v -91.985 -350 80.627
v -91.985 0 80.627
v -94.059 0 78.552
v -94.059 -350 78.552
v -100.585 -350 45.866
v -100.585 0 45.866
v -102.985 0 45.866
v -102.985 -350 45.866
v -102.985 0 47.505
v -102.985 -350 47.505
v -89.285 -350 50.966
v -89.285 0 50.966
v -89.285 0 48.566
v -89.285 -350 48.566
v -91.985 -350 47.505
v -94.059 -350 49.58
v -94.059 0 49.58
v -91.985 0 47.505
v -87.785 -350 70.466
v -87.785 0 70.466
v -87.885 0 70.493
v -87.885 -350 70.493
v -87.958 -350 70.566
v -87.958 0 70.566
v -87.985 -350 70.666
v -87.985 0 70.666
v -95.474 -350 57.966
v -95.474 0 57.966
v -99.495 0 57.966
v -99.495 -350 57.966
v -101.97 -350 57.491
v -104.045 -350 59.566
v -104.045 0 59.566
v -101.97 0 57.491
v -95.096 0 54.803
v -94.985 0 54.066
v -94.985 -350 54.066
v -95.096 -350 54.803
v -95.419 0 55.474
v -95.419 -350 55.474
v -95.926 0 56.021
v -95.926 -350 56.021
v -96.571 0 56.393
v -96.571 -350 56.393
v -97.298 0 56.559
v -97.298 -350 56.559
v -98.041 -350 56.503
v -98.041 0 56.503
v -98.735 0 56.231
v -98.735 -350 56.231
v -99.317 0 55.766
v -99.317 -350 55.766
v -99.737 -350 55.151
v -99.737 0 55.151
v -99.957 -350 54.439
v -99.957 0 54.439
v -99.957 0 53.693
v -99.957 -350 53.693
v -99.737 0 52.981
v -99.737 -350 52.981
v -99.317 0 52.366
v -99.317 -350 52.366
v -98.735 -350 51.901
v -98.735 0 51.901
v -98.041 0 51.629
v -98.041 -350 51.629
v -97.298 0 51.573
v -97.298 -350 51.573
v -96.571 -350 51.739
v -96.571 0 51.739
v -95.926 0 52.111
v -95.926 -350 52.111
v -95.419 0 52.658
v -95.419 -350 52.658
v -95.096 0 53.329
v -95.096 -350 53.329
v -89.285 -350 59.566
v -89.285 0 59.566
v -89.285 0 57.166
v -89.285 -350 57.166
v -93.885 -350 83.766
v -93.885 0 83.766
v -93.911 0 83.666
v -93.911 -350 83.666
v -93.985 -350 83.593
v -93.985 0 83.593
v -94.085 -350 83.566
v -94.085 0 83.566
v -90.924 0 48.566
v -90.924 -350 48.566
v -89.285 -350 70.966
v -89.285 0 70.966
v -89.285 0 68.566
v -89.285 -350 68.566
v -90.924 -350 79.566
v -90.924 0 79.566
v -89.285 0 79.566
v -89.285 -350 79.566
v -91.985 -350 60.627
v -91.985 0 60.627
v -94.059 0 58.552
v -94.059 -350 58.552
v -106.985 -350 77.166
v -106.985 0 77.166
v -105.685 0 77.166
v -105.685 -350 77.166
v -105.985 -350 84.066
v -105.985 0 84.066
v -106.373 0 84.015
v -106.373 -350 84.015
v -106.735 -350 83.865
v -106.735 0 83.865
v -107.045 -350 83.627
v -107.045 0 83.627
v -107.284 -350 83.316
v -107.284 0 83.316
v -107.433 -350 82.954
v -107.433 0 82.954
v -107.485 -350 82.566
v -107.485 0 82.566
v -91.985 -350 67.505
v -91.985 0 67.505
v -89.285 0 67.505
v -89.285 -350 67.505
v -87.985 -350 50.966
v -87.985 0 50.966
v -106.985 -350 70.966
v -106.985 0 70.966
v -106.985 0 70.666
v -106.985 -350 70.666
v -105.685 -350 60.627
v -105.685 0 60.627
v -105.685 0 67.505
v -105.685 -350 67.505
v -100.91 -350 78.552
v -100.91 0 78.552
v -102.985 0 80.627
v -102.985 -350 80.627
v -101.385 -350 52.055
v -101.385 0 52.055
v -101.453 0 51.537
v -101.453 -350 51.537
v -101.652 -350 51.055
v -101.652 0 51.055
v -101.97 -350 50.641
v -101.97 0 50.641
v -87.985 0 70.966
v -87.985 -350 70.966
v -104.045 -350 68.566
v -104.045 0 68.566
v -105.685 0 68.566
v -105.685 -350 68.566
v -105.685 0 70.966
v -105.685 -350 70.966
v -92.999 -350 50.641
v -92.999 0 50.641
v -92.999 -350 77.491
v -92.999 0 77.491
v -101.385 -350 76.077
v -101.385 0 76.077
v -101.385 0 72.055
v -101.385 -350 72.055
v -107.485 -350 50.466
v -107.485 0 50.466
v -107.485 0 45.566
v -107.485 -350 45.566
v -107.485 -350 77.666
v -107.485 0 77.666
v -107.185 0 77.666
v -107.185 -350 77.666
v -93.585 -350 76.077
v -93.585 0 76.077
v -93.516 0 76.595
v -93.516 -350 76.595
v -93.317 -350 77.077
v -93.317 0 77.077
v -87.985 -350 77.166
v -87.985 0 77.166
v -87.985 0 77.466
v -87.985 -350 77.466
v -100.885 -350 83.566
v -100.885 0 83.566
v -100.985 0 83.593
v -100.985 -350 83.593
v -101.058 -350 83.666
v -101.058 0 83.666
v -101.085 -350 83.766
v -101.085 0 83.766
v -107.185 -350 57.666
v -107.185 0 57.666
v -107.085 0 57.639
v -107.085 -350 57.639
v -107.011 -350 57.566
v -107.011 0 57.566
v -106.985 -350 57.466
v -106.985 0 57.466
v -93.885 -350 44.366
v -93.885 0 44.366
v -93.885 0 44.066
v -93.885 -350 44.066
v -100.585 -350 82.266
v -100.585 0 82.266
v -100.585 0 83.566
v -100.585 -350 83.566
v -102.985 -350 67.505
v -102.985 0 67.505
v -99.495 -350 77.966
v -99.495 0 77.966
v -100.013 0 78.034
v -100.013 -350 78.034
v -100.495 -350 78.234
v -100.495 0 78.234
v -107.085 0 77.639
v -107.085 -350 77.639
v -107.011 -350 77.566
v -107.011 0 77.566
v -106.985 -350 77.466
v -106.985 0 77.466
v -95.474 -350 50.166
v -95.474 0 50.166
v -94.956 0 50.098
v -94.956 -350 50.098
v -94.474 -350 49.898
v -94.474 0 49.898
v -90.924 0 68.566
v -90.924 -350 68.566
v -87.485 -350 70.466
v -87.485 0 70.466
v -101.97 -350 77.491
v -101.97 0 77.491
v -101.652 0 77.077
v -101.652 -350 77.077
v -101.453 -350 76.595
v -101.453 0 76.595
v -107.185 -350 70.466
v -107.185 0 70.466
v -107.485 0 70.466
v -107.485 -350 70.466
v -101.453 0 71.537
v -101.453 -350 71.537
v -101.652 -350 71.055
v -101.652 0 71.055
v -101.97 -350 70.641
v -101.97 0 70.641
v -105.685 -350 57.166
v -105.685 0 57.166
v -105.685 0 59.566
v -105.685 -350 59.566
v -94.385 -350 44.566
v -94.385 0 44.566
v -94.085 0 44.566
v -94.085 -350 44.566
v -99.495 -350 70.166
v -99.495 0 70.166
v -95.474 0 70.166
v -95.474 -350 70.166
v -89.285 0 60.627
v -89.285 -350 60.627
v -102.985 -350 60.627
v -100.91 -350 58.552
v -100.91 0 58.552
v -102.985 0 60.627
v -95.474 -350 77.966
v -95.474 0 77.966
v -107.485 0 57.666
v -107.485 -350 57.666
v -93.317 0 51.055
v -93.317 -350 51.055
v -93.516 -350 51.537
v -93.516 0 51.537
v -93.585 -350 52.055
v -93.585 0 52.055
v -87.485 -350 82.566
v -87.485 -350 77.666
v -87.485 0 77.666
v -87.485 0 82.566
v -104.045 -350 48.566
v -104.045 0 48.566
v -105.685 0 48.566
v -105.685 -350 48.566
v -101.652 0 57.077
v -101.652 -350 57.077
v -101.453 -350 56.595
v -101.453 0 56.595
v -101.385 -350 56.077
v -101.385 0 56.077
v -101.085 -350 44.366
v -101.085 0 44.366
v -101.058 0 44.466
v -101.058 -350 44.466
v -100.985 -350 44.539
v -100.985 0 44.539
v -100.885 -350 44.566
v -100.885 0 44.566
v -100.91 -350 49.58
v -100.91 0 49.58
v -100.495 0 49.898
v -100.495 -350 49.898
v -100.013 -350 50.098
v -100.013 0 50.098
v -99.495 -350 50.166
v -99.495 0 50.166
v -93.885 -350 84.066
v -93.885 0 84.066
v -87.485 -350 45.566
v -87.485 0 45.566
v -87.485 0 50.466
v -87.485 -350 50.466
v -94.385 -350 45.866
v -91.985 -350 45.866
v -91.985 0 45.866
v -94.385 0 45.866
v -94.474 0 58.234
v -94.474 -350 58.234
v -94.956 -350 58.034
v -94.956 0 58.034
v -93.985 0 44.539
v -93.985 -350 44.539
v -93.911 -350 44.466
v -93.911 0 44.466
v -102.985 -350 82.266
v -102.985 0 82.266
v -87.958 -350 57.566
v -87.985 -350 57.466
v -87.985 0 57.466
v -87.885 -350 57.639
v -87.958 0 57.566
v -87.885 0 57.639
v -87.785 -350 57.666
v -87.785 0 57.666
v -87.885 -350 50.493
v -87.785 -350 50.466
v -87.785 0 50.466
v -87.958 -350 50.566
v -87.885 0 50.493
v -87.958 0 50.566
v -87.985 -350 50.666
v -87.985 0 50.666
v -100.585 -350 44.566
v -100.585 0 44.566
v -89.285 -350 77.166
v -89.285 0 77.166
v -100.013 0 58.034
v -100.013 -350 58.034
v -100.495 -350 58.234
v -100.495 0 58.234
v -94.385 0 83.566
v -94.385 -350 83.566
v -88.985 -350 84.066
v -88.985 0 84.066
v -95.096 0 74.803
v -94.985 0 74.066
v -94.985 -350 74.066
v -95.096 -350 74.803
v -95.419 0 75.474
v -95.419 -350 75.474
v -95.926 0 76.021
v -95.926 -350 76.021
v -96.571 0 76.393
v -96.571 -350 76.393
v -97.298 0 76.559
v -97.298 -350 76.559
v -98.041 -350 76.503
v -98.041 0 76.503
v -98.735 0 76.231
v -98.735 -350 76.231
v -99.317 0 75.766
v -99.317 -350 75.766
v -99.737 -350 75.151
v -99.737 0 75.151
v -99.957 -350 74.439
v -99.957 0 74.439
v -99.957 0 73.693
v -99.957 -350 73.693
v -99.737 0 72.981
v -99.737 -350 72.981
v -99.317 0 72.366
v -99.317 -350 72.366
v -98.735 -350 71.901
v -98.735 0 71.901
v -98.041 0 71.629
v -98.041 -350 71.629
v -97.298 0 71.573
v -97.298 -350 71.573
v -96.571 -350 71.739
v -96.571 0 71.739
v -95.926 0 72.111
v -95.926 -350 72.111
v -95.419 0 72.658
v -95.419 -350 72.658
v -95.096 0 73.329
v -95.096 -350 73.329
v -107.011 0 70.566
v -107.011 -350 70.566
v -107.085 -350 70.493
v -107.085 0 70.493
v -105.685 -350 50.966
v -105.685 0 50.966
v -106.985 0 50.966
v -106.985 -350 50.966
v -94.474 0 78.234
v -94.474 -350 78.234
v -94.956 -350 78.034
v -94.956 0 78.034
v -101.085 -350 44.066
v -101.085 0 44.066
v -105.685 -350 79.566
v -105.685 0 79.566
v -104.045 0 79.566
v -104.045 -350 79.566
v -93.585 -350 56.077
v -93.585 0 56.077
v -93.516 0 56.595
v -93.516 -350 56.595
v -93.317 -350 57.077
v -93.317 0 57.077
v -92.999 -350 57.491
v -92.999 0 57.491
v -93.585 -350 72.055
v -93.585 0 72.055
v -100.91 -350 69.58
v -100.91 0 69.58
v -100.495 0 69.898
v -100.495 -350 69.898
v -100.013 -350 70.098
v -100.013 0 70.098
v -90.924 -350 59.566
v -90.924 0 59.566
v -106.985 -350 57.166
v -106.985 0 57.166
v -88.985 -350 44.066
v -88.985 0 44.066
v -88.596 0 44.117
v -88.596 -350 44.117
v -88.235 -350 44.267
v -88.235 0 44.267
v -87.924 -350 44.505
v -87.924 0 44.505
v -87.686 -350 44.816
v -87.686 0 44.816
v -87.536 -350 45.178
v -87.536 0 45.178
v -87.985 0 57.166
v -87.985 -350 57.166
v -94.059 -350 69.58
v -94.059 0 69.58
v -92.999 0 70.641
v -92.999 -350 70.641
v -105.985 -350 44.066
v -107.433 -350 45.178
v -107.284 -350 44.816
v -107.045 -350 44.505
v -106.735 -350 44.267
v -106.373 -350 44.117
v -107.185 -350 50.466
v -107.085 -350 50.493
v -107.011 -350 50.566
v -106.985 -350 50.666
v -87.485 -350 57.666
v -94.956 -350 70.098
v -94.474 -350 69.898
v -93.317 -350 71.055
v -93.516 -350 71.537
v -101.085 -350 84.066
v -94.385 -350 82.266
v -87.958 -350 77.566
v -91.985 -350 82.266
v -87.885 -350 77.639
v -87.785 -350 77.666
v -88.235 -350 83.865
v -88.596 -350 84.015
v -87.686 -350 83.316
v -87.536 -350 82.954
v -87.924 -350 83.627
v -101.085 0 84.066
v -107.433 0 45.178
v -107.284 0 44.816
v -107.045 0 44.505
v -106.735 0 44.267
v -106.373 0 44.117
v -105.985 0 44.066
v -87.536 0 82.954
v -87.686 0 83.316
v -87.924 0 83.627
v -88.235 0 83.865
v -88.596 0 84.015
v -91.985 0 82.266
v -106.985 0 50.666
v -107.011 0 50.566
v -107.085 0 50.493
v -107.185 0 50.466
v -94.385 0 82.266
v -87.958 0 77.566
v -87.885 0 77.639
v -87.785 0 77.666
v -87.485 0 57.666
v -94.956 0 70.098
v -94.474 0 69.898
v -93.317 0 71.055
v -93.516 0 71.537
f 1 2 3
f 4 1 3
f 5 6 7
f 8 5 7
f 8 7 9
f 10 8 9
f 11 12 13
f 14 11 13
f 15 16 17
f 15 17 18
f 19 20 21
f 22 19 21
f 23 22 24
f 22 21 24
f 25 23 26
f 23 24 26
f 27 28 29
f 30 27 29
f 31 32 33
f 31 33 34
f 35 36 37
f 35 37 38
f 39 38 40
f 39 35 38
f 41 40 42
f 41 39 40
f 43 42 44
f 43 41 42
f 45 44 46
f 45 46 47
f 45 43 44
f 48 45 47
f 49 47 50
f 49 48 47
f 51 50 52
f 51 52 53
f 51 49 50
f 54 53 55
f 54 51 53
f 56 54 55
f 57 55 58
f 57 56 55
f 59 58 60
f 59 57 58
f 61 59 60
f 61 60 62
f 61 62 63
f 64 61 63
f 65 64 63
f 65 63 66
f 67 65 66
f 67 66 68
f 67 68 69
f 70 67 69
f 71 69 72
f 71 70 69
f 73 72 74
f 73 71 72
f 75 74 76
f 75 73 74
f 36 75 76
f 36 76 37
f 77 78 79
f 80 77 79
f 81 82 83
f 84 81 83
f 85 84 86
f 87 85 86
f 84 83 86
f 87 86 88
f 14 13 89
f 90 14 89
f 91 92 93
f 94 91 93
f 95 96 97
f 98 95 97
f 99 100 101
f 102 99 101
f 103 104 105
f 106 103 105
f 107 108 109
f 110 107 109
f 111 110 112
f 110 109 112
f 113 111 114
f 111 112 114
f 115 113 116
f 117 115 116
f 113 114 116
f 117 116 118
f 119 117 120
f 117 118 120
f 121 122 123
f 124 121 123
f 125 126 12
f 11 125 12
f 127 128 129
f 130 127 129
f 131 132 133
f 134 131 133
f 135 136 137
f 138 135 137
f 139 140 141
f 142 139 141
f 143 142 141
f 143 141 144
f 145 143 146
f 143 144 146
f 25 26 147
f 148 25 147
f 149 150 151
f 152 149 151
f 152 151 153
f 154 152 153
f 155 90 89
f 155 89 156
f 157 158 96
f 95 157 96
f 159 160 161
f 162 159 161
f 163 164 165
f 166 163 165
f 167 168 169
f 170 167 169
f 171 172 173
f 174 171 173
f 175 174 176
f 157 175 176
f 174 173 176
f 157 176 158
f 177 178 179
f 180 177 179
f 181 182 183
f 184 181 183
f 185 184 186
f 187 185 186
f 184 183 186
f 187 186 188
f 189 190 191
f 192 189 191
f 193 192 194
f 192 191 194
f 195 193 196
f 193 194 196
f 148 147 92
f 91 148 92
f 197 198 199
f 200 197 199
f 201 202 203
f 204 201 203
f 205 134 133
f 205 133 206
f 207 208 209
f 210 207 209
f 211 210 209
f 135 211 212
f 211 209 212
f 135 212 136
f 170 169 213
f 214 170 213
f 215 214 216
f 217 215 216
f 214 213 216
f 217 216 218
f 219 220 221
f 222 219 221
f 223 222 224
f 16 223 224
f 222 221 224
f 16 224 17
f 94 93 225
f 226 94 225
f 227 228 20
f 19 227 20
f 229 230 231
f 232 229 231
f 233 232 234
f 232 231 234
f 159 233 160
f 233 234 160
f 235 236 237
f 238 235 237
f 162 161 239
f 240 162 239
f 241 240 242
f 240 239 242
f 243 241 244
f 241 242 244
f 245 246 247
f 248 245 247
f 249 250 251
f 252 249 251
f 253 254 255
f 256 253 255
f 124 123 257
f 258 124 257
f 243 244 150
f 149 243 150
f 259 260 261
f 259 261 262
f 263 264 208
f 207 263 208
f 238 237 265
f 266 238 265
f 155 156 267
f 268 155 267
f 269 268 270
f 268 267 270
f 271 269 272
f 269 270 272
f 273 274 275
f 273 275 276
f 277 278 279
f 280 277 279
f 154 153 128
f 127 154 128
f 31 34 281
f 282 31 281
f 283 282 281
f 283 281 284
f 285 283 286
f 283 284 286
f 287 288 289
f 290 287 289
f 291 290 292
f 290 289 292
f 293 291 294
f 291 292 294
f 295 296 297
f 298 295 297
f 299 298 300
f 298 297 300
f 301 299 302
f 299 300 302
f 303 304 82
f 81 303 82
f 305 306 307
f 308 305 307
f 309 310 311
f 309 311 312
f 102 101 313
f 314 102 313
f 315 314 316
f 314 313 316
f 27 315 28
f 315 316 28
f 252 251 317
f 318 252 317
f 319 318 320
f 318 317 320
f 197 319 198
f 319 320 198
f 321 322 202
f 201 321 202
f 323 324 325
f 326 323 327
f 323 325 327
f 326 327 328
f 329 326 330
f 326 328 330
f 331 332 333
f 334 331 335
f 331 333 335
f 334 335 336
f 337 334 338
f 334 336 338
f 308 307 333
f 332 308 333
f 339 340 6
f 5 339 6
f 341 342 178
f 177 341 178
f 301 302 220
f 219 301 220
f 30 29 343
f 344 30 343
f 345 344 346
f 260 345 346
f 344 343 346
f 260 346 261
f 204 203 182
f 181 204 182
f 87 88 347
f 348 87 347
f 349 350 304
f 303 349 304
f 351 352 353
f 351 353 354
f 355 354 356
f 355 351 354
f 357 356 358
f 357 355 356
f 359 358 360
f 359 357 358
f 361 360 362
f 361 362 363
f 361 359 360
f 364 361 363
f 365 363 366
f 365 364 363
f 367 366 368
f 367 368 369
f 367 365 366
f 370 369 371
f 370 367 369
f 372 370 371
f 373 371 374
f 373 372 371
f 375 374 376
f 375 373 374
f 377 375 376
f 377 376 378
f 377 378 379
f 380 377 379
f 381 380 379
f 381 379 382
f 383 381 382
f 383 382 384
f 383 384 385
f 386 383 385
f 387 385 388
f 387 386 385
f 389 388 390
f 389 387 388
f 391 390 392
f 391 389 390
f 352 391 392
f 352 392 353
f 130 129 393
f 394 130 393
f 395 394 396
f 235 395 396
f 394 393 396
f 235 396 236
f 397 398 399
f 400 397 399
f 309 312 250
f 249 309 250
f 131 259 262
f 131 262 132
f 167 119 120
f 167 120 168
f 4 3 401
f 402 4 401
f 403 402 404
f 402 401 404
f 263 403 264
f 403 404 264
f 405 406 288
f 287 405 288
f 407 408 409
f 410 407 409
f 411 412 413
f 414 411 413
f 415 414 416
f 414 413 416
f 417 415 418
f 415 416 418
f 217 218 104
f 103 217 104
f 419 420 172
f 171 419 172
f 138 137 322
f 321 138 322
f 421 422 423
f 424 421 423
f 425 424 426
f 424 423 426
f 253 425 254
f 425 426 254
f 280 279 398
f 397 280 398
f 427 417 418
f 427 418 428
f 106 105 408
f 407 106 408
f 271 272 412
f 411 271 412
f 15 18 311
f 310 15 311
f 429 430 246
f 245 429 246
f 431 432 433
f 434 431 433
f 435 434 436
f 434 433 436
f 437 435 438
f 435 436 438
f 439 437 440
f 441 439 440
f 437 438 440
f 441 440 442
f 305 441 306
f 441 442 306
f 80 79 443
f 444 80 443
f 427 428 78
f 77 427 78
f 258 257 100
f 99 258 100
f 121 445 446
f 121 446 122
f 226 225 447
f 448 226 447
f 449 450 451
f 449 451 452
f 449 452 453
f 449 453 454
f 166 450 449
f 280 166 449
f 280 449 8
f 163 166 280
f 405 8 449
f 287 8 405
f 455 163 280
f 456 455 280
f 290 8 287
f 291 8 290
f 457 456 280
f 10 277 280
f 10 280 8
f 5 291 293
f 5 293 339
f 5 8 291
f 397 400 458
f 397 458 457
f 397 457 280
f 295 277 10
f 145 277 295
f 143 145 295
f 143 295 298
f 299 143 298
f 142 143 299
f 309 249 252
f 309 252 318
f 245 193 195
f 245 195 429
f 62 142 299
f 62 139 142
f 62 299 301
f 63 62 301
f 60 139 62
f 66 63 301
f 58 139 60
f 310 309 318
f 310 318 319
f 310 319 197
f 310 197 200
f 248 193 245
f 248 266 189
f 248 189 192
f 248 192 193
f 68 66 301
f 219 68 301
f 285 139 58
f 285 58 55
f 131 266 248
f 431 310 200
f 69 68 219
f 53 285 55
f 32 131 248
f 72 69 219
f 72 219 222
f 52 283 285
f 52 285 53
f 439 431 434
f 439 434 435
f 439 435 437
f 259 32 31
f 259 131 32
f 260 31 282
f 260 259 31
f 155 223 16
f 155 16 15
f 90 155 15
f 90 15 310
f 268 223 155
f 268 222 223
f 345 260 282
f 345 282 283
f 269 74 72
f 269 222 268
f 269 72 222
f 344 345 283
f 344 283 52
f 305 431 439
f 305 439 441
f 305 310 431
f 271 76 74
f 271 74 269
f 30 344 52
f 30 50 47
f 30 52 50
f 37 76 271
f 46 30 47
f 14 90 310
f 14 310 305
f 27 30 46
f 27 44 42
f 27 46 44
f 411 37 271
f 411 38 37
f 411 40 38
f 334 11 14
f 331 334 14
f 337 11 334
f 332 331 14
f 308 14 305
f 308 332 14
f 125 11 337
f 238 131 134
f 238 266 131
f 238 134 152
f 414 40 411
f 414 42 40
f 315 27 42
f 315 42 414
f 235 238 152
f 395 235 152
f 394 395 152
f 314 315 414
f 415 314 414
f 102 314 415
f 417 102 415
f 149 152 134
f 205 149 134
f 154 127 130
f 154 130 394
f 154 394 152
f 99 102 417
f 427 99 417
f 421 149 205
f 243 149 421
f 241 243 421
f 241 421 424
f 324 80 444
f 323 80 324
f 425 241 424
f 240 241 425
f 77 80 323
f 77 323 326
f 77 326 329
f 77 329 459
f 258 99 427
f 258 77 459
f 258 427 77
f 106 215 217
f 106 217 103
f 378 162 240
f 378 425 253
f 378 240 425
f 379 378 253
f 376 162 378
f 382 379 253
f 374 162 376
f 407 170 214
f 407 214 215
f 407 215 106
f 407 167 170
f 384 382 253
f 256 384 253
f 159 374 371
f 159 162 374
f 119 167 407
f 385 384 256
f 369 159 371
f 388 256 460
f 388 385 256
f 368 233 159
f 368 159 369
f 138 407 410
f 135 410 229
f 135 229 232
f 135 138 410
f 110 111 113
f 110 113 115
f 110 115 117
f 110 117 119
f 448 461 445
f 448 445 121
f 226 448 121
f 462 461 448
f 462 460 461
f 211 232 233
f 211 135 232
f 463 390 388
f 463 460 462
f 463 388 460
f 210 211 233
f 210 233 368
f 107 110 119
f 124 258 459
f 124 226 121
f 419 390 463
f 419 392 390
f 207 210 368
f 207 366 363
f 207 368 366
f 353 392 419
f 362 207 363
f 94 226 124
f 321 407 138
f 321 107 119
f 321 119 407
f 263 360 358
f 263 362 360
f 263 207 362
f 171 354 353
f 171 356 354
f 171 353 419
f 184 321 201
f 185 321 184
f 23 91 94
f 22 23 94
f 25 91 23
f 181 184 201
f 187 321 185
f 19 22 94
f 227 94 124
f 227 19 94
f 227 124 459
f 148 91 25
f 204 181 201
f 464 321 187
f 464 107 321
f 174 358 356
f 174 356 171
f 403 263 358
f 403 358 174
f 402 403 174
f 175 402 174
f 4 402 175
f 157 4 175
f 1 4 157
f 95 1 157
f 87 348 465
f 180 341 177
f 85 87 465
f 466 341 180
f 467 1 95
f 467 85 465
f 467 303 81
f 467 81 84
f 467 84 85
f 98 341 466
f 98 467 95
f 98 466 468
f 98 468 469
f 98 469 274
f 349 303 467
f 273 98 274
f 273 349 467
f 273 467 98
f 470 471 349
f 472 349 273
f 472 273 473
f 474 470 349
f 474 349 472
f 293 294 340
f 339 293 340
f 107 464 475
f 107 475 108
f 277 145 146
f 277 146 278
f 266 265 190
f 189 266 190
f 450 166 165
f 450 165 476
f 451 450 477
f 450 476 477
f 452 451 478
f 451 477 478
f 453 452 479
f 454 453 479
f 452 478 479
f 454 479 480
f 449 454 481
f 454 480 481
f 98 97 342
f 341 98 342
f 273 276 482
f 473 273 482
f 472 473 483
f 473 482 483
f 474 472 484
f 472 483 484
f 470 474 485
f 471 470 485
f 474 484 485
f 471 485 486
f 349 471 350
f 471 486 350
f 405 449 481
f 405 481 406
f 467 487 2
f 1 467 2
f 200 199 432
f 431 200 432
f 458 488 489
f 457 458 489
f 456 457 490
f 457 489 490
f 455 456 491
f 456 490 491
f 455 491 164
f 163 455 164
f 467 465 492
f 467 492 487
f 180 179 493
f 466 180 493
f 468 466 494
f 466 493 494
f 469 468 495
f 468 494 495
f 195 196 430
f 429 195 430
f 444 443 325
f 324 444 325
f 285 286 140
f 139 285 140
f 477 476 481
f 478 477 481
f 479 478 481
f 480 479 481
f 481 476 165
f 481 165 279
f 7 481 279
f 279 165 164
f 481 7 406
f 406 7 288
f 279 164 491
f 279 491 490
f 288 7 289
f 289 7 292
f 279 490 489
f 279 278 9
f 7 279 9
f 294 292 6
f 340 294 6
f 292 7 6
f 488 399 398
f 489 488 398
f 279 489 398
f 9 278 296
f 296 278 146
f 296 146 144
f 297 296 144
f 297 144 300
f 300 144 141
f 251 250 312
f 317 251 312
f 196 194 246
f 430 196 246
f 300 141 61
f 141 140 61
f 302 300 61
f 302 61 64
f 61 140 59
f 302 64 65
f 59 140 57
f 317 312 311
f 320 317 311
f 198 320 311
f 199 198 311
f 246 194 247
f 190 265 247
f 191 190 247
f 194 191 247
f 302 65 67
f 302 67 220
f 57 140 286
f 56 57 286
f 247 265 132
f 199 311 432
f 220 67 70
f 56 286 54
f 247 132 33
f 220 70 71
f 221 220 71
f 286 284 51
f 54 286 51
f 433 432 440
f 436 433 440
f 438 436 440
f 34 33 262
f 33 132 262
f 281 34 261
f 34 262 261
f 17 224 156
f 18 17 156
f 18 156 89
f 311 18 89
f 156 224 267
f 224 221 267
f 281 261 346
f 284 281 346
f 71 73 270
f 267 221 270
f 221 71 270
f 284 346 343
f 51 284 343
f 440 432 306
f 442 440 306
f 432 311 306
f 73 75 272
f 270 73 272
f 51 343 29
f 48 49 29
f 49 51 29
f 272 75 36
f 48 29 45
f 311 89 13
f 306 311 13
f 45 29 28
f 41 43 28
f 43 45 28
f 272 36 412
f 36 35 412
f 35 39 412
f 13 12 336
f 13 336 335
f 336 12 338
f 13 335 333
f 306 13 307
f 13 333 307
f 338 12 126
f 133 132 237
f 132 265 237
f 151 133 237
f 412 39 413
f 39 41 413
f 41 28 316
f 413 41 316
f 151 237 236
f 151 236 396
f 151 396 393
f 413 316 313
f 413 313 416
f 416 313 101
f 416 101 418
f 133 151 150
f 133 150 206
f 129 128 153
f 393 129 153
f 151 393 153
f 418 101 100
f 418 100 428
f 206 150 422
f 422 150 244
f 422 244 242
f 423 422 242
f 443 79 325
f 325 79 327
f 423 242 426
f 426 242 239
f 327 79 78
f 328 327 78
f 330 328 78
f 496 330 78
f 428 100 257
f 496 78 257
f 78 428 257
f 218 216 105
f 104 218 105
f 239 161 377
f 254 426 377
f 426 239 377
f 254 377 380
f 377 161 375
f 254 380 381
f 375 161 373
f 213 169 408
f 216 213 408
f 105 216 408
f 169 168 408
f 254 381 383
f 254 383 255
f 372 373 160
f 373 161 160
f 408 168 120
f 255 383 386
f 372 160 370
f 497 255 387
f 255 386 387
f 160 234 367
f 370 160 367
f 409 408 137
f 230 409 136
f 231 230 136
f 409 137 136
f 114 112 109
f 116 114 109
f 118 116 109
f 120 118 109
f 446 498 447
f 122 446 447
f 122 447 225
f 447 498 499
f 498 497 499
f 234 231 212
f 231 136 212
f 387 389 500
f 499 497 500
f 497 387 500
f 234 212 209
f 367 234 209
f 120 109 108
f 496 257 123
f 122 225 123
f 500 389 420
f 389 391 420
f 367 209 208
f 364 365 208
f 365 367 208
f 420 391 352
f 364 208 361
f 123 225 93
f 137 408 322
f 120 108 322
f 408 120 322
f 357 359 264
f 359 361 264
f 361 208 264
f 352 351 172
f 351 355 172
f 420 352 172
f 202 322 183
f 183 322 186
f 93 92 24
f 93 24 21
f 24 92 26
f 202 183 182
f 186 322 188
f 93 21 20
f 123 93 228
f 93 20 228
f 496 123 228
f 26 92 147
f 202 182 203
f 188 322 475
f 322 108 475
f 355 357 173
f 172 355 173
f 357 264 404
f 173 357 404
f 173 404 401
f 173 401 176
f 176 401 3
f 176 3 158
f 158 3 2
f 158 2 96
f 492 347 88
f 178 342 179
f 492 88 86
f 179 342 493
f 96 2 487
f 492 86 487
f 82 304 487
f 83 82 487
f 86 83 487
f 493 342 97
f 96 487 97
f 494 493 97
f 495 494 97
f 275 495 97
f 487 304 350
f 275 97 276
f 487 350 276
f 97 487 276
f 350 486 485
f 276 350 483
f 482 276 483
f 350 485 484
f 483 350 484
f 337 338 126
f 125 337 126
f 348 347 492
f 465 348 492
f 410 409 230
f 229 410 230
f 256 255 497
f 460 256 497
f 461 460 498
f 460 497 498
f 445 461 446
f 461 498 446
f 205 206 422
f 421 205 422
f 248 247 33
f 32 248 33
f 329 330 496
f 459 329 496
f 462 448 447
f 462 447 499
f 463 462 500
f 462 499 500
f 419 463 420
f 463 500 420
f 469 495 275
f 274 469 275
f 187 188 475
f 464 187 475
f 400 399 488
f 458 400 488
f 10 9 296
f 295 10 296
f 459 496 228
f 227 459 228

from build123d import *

# Parameters (mm, degrees)
F0_R     = 2.5
F1_DEPTH = 350


with BuildPart() as f1:
    # F0 (on Front) → F1 (new body)
    with BuildSketch(Plane.XZ):
        with BuildLine():
            Line((-91.984542, 44.065978), (-88.984542, 44.065978))
            ThreePointArc((-88.984542, 44.065978), (-87.923881, 44.505318), (-87.484542, 45.565978))
            Line((-87.484542, 45.565978), (-87.484542, 48.565978))
            Line((-87.484542, 48.565978), (-87.484542, 50.465978))
            Line((-87.484542, 50.465978), (-87.784542, 50.465978))
            ThreePointArc((-87.784542, 50.465978), (-87.925963, 50.524557), (-87.984542, 50.665978))
            Line((-87.984542, 50.665978), (-87.984542, 50.965978))
            Line((-87.984542, 50.965978), (-89.284542, 50.965978))
            Line((-89.284542, 50.965978), (-89.284542, 48.565978))
            Line((-89.284542, 48.565978), (-90.923881, 48.565978))
            Line((-90.923881, 48.565978), (-92.998755, 50.640852))
            ThreePointArc((-92.998755, 50.640852), (-93.432301, 51.289698), (-93.584542, 52.055065))
            Line((-93.584542, 52.055065), (-93.584542, 56.076891))
            ThreePointArc((-93.584542, 56.076891), (-93.432301, 56.842257), (-92.998755, 57.491104))
            Line((-92.998755, 57.491104), (-90.923881, 59.565978))
            Line((-90.923881, 59.565978), (-89.284542, 59.565978))
            Line((-89.284542, 59.565978), (-89.284542, 57.165978))
            Line((-89.284542, 57.165978), (-87.984542, 57.165978))
            Line((-87.984542, 57.165978), (-87.984542, 57.465978))
            ThreePointArc((-87.984542, 57.465978), (-87.925963, 57.607399), (-87.784542, 57.665978))
            Line((-87.784542, 57.665978), (-87.484542, 57.665978))
            Line((-87.484542, 57.665978), (-87.484542, 59.565978))
            Line((-87.484542, 59.565978), (-87.484542, 62.565978))
            Line((-87.484542, 62.565978), (-87.484542, 64.065978))
            Line((-87.484542, 64.065978), (-87.484542, 65.565978))
            Line((-87.484542, 65.565978), (-87.484542, 68.565978))
            Line((-87.484542, 68.565978), (-87.484542, 70.465978))
            Line((-87.484542, 70.465978), (-87.784542, 70.465978))
            ThreePointArc((-87.784542, 70.465978), (-87.925963, 70.524557), (-87.984542, 70.665978))
            Line((-87.984542, 70.665978), (-87.984542, 70.965978))
            Line((-87.984542, 70.965978), (-89.284542, 70.965978))
            Line((-89.284542, 70.965978), (-89.284542, 68.565978))
            Line((-89.284542, 68.565978), (-90.923881, 68.565978))
            Line((-90.923881, 68.565978), (-92.998755, 70.640852))
            ThreePointArc((-92.998755, 70.640852), (-93.432301, 71.289698), (-93.584542, 72.055065))
            Line((-93.584542, 72.055065), (-93.584542, 76.076891))
            ThreePointArc((-93.584542, 76.076891), (-93.432301, 76.842257), (-92.998755, 77.491104))
            Line((-92.998755, 77.491104), (-90.923881, 79.565978))
            Line((-90.923881, 79.565978), (-89.284542, 79.565978))
            Line((-89.284542, 79.565978), (-89.284542, 77.165978))
            Line((-89.284542, 77.165978), (-87.984542, 77.165978))
            Line((-87.984542, 77.165978), (-87.984542, 77.465978))
            ThreePointArc((-87.984542, 77.465978), (-87.925963, 77.607399), (-87.784542, 77.665978))
            Line((-87.784542, 77.665978), (-87.484542, 77.665978))
            Line((-87.484542, 77.665978), (-87.484542, 79.565978))
            Line((-87.484542, 79.565978), (-87.484542, 82.565978))
            ThreePointArc((-87.484542, 82.565978), (-87.923881, 83.626638), (-88.984542, 84.065978))
            Line((-88.984542, 84.065978), (-91.984542, 84.065978))
            Line((-91.984542, 84.065978), (-93.384542, 84.065978))
            Line((-93.384542, 84.065978), (-93.884542, 84.065978))
            Line((-93.884542, 84.065978), (-93.884542, 83.765978))
            ThreePointArc((-93.884542, 83.765978), (-93.94312, 83.624557), (-94.084542, 83.565978))
            Line((-94.084542, 83.565978), (-94.384542, 83.565978))
            Line((-94.384542, 83.565978), (-94.384542, 82.265978))
            Line((-94.384542, 82.265978), (-91.984542, 82.265978))
            Line((-91.984542, 82.265978), (-91.984542, 80.626638))
            Line((-91.984542, 80.626638), (-94.059415, 78.551764))
            ThreePointArc((-94.059415, 78.551764), (-94.708262, 78.118219), (-95.473629, 77.965978))
            Line((-95.473629, 77.965978), (-99.495454, 77.965978))
            ThreePointArc((-99.495454, 77.965978), (-100.260821, 78.118219), (-100.909668, 78.551764))
            Line((-100.909668, 78.551764), (-102.984542, 80.626638))
            Line((-102.984542, 80.626638), (-102.984542, 82.265978))
            Line((-102.984542, 82.265978), (-100.584542, 82.265978))
            Line((-100.584542, 82.265978), (-100.584542, 83.565978))
            Line((-100.584542, 83.565978), (-100.884542, 83.565978))
            ThreePointArc((-100.884542, 83.565978), (-101.025963, 83.624557), (-101.084542, 83.765978))
            Line((-101.084542, 83.765978), (-101.084542, 84.065978))
            Line((-101.084542, 84.065978), (-101.584542, 84.065978))
            Line((-101.584542, 84.065978), (-102.984542, 84.065978))
            Line((-102.984542, 84.065978), (-105.984542, 84.065978))
            ThreePointArc((-105.984542, 84.065978), (-107.045202, 83.626638), (-107.484542, 82.565978))
            Line((-107.484542, 82.565978), (-107.484542, 79.565978))
            Line((-107.484542, 79.565978), (-107.484542, 77.665978))
            Line((-107.484542, 77.665978), (-107.184542, 77.665978))
            ThreePointArc((-107.184542, 77.665978), (-107.04312, 77.607399), (-106.984542, 77.465978))
            Line((-106.984542, 77.465978), (-106.984542, 77.165978))
            Line((-106.984542, 77.165978), (-105.684542, 77.165978))
            Line((-105.684542, 77.165978), (-105.684542, 79.565978))
            Line((-105.684542, 79.565978), (-104.045202, 79.565978))
            Line((-104.045202, 79.565978), (-101.970328, 77.491104))
            ThreePointArc((-101.970328, 77.491104), (-101.536782, 76.842257), (-101.384542, 76.076891))
            Line((-101.384542, 76.076891), (-101.384542, 72.055065))
            ThreePointArc((-101.384542, 72.055065), (-101.536782, 71.289698), (-101.970328, 70.640852))
            Line((-101.970328, 70.640852), (-104.045202, 68.565978))
            Line((-104.045202, 68.565978), (-105.684542, 68.565978))
            Line((-105.684542, 68.565978), (-105.684542, 70.965978))
            Line((-105.684542, 70.965978), (-106.984542, 70.965978))
            Line((-106.984542, 70.965978), (-106.984542, 70.665978))
            ThreePointArc((-106.984542, 70.665978), (-107.04312, 70.524557), (-107.184542, 70.465978))
            Line((-107.184542, 70.465978), (-107.484542, 70.465978))
            Line((-107.484542, 70.465978), (-107.484542, 68.565978))
            Line((-107.484542, 68.565978), (-107.484542, 65.565978))
            Line((-107.484542, 65.565978), (-107.484542, 64.065978))
            Line((-107.484542, 64.065978), (-107.484542, 62.565978))
            Line((-107.484542, 62.565978), (-107.484542, 59.565978))
            Line((-107.484542, 59.565978), (-107.484542, 57.665978))
            Line((-107.484542, 57.665978), (-107.184542, 57.665978))
            ThreePointArc((-107.184542, 57.665978), (-107.04312, 57.607399), (-106.984542, 57.465978))
            Line((-106.984542, 57.465978), (-106.984542, 57.165978))
            Line((-106.984542, 57.165978), (-105.684542, 57.165978))
            Line((-105.684542, 57.165978), (-105.684542, 59.565978))
            Line((-105.684542, 59.565978), (-104.045202, 59.565978))
            Line((-104.045202, 59.565978), (-101.970328, 57.491104))
            ThreePointArc((-101.970328, 57.491104), (-101.536782, 56.842257), (-101.384542, 56.076891))
            Line((-101.384542, 56.076891), (-101.384542, 52.055065))
            ThreePointArc((-101.384542, 52.055065), (-101.536782, 51.289698), (-101.970328, 50.640852))
            Line((-101.970328, 50.640852), (-104.045202, 48.565978))
            Line((-104.045202, 48.565978), (-105.684542, 48.565978))
            Line((-105.684542, 48.565978), (-105.684542, 50.965978))
            Line((-105.684542, 50.965978), (-106.984542, 50.965978))
            Line((-106.984542, 50.965978), (-106.984542, 50.665978))
            ThreePointArc((-106.984542, 50.665978), (-107.04312, 50.524557), (-107.184542, 50.465978))
            Line((-107.184542, 50.465978), (-107.484542, 50.465978))
            Line((-107.484542, 50.465978), (-107.484542, 48.565978))
            Line((-107.484542, 48.565978), (-107.484542, 45.565978))
            ThreePointArc((-107.484542, 45.565978), (-107.045202, 44.505318), (-105.984542, 44.065978))
            Line((-105.984542, 44.065978), (-102.984542, 44.065978))
            Line((-102.984542, 44.065978), (-101.584542, 44.065978))
            Line((-101.584542, 44.065978), (-101.084542, 44.065978))
            Line((-101.084542, 44.065978), (-101.084542, 44.365978))
            ThreePointArc((-101.084542, 44.365978), (-101.025963, 44.507399), (-100.884542, 44.565978))
            Line((-100.884542, 44.565978), (-100.584542, 44.565978))
            Line((-100.584542, 44.565978), (-100.584542, 45.865978))
            Line((-100.584542, 45.865978), (-102.984542, 45.865978))
            Line((-102.984542, 45.865978), (-102.984542, 47.505318))
            Line((-102.984542, 47.505318), (-100.909668, 49.580191))
            ThreePointArc((-100.909668, 49.580191), (-100.260821, 50.013737), (-99.495454, 50.165978))
            Line((-99.495454, 50.165978), (-95.473629, 50.165978))
            ThreePointArc((-95.473629, 50.165978), (-94.708262, 50.013737), (-94.059415, 49.580191))
            Line((-94.059415, 49.580191), (-91.984542, 47.505318))
            Line((-91.984542, 47.505318), (-91.984542, 45.865978))
            Line((-91.984542, 45.865978), (-94.384542, 45.865978))
            Line((-94.384542, 45.865978), (-94.384542, 44.565978))
            Line((-94.384542, 44.565978), (-94.084542, 44.565978))
            ThreePointArc((-94.084542, 44.565978), (-93.94312, 44.507399), (-93.884542, 44.365978))
            Line((-93.884542, 44.365978), (-93.884542, 44.065978))
            Line((-93.884542, 44.065978), (-93.384542, 44.065978))
            Line((-93.384542, 44.065978), (-91.984542, 44.065978))
        make_face()
        with Locations((-97.484542, 54.065978)):
            Circle(F0_R, mode=Mode.SUBTRACT)
        with BuildLine():
            ThreePointArc((-94.059415, 58.551764), (-94.708262, 58.118219), (-95.473629, 57.965978))
            Line((-95.473629, 57.965978), (-99.495454, 57.965978))
            ThreePointArc((-99.495454, 57.965978), (-100.260821, 58.118219), (-100.909668, 58.551764))
            Line((-100.909668, 58.551764), (-102.984542, 60.626638))
            Line((-102.984542, 60.626638), (-105.684542, 60.626638))
            Line((-105.684542, 60.626638), (-105.684542, 64.065978))
            Line((-105.684542, 64.065978), (-105.684542, 67.505318))
            Line((-105.684542, 67.505318), (-102.984542, 67.505318))
            Line((-102.984542, 67.505318), (-100.909668, 69.580191))
            ThreePointArc((-100.909668, 69.580191), (-100.260821, 70.013737), (-99.495454, 70.165978))
            Line((-99.495454, 70.165978), (-95.473629, 70.165978))
            ThreePointArc((-95.473629, 70.165978), (-94.708262, 70.013737), (-94.059415, 69.580191))
            Line((-94.059415, 69.580191), (-91.984542, 67.505318))
            Line((-91.984542, 67.505318), (-89.284542, 67.505318))
            Line((-89.284542, 67.505318), (-89.284542, 64.065978))
            Line((-89.284542, 64.065978), (-89.284542, 60.626638))
            Line((-89.284542, 60.626638), (-91.984542, 60.626638))
            Line((-91.984542, 60.626638), (-94.059415, 58.551764))
        make_face(mode=Mode.SUBTRACT)
        with Locations((-97.484542, 74.065978)):
            Circle(F0_R, mode=Mode.SUBTRACT)
    extrude(amount=F1_DEPTH)


solid = f1.part
